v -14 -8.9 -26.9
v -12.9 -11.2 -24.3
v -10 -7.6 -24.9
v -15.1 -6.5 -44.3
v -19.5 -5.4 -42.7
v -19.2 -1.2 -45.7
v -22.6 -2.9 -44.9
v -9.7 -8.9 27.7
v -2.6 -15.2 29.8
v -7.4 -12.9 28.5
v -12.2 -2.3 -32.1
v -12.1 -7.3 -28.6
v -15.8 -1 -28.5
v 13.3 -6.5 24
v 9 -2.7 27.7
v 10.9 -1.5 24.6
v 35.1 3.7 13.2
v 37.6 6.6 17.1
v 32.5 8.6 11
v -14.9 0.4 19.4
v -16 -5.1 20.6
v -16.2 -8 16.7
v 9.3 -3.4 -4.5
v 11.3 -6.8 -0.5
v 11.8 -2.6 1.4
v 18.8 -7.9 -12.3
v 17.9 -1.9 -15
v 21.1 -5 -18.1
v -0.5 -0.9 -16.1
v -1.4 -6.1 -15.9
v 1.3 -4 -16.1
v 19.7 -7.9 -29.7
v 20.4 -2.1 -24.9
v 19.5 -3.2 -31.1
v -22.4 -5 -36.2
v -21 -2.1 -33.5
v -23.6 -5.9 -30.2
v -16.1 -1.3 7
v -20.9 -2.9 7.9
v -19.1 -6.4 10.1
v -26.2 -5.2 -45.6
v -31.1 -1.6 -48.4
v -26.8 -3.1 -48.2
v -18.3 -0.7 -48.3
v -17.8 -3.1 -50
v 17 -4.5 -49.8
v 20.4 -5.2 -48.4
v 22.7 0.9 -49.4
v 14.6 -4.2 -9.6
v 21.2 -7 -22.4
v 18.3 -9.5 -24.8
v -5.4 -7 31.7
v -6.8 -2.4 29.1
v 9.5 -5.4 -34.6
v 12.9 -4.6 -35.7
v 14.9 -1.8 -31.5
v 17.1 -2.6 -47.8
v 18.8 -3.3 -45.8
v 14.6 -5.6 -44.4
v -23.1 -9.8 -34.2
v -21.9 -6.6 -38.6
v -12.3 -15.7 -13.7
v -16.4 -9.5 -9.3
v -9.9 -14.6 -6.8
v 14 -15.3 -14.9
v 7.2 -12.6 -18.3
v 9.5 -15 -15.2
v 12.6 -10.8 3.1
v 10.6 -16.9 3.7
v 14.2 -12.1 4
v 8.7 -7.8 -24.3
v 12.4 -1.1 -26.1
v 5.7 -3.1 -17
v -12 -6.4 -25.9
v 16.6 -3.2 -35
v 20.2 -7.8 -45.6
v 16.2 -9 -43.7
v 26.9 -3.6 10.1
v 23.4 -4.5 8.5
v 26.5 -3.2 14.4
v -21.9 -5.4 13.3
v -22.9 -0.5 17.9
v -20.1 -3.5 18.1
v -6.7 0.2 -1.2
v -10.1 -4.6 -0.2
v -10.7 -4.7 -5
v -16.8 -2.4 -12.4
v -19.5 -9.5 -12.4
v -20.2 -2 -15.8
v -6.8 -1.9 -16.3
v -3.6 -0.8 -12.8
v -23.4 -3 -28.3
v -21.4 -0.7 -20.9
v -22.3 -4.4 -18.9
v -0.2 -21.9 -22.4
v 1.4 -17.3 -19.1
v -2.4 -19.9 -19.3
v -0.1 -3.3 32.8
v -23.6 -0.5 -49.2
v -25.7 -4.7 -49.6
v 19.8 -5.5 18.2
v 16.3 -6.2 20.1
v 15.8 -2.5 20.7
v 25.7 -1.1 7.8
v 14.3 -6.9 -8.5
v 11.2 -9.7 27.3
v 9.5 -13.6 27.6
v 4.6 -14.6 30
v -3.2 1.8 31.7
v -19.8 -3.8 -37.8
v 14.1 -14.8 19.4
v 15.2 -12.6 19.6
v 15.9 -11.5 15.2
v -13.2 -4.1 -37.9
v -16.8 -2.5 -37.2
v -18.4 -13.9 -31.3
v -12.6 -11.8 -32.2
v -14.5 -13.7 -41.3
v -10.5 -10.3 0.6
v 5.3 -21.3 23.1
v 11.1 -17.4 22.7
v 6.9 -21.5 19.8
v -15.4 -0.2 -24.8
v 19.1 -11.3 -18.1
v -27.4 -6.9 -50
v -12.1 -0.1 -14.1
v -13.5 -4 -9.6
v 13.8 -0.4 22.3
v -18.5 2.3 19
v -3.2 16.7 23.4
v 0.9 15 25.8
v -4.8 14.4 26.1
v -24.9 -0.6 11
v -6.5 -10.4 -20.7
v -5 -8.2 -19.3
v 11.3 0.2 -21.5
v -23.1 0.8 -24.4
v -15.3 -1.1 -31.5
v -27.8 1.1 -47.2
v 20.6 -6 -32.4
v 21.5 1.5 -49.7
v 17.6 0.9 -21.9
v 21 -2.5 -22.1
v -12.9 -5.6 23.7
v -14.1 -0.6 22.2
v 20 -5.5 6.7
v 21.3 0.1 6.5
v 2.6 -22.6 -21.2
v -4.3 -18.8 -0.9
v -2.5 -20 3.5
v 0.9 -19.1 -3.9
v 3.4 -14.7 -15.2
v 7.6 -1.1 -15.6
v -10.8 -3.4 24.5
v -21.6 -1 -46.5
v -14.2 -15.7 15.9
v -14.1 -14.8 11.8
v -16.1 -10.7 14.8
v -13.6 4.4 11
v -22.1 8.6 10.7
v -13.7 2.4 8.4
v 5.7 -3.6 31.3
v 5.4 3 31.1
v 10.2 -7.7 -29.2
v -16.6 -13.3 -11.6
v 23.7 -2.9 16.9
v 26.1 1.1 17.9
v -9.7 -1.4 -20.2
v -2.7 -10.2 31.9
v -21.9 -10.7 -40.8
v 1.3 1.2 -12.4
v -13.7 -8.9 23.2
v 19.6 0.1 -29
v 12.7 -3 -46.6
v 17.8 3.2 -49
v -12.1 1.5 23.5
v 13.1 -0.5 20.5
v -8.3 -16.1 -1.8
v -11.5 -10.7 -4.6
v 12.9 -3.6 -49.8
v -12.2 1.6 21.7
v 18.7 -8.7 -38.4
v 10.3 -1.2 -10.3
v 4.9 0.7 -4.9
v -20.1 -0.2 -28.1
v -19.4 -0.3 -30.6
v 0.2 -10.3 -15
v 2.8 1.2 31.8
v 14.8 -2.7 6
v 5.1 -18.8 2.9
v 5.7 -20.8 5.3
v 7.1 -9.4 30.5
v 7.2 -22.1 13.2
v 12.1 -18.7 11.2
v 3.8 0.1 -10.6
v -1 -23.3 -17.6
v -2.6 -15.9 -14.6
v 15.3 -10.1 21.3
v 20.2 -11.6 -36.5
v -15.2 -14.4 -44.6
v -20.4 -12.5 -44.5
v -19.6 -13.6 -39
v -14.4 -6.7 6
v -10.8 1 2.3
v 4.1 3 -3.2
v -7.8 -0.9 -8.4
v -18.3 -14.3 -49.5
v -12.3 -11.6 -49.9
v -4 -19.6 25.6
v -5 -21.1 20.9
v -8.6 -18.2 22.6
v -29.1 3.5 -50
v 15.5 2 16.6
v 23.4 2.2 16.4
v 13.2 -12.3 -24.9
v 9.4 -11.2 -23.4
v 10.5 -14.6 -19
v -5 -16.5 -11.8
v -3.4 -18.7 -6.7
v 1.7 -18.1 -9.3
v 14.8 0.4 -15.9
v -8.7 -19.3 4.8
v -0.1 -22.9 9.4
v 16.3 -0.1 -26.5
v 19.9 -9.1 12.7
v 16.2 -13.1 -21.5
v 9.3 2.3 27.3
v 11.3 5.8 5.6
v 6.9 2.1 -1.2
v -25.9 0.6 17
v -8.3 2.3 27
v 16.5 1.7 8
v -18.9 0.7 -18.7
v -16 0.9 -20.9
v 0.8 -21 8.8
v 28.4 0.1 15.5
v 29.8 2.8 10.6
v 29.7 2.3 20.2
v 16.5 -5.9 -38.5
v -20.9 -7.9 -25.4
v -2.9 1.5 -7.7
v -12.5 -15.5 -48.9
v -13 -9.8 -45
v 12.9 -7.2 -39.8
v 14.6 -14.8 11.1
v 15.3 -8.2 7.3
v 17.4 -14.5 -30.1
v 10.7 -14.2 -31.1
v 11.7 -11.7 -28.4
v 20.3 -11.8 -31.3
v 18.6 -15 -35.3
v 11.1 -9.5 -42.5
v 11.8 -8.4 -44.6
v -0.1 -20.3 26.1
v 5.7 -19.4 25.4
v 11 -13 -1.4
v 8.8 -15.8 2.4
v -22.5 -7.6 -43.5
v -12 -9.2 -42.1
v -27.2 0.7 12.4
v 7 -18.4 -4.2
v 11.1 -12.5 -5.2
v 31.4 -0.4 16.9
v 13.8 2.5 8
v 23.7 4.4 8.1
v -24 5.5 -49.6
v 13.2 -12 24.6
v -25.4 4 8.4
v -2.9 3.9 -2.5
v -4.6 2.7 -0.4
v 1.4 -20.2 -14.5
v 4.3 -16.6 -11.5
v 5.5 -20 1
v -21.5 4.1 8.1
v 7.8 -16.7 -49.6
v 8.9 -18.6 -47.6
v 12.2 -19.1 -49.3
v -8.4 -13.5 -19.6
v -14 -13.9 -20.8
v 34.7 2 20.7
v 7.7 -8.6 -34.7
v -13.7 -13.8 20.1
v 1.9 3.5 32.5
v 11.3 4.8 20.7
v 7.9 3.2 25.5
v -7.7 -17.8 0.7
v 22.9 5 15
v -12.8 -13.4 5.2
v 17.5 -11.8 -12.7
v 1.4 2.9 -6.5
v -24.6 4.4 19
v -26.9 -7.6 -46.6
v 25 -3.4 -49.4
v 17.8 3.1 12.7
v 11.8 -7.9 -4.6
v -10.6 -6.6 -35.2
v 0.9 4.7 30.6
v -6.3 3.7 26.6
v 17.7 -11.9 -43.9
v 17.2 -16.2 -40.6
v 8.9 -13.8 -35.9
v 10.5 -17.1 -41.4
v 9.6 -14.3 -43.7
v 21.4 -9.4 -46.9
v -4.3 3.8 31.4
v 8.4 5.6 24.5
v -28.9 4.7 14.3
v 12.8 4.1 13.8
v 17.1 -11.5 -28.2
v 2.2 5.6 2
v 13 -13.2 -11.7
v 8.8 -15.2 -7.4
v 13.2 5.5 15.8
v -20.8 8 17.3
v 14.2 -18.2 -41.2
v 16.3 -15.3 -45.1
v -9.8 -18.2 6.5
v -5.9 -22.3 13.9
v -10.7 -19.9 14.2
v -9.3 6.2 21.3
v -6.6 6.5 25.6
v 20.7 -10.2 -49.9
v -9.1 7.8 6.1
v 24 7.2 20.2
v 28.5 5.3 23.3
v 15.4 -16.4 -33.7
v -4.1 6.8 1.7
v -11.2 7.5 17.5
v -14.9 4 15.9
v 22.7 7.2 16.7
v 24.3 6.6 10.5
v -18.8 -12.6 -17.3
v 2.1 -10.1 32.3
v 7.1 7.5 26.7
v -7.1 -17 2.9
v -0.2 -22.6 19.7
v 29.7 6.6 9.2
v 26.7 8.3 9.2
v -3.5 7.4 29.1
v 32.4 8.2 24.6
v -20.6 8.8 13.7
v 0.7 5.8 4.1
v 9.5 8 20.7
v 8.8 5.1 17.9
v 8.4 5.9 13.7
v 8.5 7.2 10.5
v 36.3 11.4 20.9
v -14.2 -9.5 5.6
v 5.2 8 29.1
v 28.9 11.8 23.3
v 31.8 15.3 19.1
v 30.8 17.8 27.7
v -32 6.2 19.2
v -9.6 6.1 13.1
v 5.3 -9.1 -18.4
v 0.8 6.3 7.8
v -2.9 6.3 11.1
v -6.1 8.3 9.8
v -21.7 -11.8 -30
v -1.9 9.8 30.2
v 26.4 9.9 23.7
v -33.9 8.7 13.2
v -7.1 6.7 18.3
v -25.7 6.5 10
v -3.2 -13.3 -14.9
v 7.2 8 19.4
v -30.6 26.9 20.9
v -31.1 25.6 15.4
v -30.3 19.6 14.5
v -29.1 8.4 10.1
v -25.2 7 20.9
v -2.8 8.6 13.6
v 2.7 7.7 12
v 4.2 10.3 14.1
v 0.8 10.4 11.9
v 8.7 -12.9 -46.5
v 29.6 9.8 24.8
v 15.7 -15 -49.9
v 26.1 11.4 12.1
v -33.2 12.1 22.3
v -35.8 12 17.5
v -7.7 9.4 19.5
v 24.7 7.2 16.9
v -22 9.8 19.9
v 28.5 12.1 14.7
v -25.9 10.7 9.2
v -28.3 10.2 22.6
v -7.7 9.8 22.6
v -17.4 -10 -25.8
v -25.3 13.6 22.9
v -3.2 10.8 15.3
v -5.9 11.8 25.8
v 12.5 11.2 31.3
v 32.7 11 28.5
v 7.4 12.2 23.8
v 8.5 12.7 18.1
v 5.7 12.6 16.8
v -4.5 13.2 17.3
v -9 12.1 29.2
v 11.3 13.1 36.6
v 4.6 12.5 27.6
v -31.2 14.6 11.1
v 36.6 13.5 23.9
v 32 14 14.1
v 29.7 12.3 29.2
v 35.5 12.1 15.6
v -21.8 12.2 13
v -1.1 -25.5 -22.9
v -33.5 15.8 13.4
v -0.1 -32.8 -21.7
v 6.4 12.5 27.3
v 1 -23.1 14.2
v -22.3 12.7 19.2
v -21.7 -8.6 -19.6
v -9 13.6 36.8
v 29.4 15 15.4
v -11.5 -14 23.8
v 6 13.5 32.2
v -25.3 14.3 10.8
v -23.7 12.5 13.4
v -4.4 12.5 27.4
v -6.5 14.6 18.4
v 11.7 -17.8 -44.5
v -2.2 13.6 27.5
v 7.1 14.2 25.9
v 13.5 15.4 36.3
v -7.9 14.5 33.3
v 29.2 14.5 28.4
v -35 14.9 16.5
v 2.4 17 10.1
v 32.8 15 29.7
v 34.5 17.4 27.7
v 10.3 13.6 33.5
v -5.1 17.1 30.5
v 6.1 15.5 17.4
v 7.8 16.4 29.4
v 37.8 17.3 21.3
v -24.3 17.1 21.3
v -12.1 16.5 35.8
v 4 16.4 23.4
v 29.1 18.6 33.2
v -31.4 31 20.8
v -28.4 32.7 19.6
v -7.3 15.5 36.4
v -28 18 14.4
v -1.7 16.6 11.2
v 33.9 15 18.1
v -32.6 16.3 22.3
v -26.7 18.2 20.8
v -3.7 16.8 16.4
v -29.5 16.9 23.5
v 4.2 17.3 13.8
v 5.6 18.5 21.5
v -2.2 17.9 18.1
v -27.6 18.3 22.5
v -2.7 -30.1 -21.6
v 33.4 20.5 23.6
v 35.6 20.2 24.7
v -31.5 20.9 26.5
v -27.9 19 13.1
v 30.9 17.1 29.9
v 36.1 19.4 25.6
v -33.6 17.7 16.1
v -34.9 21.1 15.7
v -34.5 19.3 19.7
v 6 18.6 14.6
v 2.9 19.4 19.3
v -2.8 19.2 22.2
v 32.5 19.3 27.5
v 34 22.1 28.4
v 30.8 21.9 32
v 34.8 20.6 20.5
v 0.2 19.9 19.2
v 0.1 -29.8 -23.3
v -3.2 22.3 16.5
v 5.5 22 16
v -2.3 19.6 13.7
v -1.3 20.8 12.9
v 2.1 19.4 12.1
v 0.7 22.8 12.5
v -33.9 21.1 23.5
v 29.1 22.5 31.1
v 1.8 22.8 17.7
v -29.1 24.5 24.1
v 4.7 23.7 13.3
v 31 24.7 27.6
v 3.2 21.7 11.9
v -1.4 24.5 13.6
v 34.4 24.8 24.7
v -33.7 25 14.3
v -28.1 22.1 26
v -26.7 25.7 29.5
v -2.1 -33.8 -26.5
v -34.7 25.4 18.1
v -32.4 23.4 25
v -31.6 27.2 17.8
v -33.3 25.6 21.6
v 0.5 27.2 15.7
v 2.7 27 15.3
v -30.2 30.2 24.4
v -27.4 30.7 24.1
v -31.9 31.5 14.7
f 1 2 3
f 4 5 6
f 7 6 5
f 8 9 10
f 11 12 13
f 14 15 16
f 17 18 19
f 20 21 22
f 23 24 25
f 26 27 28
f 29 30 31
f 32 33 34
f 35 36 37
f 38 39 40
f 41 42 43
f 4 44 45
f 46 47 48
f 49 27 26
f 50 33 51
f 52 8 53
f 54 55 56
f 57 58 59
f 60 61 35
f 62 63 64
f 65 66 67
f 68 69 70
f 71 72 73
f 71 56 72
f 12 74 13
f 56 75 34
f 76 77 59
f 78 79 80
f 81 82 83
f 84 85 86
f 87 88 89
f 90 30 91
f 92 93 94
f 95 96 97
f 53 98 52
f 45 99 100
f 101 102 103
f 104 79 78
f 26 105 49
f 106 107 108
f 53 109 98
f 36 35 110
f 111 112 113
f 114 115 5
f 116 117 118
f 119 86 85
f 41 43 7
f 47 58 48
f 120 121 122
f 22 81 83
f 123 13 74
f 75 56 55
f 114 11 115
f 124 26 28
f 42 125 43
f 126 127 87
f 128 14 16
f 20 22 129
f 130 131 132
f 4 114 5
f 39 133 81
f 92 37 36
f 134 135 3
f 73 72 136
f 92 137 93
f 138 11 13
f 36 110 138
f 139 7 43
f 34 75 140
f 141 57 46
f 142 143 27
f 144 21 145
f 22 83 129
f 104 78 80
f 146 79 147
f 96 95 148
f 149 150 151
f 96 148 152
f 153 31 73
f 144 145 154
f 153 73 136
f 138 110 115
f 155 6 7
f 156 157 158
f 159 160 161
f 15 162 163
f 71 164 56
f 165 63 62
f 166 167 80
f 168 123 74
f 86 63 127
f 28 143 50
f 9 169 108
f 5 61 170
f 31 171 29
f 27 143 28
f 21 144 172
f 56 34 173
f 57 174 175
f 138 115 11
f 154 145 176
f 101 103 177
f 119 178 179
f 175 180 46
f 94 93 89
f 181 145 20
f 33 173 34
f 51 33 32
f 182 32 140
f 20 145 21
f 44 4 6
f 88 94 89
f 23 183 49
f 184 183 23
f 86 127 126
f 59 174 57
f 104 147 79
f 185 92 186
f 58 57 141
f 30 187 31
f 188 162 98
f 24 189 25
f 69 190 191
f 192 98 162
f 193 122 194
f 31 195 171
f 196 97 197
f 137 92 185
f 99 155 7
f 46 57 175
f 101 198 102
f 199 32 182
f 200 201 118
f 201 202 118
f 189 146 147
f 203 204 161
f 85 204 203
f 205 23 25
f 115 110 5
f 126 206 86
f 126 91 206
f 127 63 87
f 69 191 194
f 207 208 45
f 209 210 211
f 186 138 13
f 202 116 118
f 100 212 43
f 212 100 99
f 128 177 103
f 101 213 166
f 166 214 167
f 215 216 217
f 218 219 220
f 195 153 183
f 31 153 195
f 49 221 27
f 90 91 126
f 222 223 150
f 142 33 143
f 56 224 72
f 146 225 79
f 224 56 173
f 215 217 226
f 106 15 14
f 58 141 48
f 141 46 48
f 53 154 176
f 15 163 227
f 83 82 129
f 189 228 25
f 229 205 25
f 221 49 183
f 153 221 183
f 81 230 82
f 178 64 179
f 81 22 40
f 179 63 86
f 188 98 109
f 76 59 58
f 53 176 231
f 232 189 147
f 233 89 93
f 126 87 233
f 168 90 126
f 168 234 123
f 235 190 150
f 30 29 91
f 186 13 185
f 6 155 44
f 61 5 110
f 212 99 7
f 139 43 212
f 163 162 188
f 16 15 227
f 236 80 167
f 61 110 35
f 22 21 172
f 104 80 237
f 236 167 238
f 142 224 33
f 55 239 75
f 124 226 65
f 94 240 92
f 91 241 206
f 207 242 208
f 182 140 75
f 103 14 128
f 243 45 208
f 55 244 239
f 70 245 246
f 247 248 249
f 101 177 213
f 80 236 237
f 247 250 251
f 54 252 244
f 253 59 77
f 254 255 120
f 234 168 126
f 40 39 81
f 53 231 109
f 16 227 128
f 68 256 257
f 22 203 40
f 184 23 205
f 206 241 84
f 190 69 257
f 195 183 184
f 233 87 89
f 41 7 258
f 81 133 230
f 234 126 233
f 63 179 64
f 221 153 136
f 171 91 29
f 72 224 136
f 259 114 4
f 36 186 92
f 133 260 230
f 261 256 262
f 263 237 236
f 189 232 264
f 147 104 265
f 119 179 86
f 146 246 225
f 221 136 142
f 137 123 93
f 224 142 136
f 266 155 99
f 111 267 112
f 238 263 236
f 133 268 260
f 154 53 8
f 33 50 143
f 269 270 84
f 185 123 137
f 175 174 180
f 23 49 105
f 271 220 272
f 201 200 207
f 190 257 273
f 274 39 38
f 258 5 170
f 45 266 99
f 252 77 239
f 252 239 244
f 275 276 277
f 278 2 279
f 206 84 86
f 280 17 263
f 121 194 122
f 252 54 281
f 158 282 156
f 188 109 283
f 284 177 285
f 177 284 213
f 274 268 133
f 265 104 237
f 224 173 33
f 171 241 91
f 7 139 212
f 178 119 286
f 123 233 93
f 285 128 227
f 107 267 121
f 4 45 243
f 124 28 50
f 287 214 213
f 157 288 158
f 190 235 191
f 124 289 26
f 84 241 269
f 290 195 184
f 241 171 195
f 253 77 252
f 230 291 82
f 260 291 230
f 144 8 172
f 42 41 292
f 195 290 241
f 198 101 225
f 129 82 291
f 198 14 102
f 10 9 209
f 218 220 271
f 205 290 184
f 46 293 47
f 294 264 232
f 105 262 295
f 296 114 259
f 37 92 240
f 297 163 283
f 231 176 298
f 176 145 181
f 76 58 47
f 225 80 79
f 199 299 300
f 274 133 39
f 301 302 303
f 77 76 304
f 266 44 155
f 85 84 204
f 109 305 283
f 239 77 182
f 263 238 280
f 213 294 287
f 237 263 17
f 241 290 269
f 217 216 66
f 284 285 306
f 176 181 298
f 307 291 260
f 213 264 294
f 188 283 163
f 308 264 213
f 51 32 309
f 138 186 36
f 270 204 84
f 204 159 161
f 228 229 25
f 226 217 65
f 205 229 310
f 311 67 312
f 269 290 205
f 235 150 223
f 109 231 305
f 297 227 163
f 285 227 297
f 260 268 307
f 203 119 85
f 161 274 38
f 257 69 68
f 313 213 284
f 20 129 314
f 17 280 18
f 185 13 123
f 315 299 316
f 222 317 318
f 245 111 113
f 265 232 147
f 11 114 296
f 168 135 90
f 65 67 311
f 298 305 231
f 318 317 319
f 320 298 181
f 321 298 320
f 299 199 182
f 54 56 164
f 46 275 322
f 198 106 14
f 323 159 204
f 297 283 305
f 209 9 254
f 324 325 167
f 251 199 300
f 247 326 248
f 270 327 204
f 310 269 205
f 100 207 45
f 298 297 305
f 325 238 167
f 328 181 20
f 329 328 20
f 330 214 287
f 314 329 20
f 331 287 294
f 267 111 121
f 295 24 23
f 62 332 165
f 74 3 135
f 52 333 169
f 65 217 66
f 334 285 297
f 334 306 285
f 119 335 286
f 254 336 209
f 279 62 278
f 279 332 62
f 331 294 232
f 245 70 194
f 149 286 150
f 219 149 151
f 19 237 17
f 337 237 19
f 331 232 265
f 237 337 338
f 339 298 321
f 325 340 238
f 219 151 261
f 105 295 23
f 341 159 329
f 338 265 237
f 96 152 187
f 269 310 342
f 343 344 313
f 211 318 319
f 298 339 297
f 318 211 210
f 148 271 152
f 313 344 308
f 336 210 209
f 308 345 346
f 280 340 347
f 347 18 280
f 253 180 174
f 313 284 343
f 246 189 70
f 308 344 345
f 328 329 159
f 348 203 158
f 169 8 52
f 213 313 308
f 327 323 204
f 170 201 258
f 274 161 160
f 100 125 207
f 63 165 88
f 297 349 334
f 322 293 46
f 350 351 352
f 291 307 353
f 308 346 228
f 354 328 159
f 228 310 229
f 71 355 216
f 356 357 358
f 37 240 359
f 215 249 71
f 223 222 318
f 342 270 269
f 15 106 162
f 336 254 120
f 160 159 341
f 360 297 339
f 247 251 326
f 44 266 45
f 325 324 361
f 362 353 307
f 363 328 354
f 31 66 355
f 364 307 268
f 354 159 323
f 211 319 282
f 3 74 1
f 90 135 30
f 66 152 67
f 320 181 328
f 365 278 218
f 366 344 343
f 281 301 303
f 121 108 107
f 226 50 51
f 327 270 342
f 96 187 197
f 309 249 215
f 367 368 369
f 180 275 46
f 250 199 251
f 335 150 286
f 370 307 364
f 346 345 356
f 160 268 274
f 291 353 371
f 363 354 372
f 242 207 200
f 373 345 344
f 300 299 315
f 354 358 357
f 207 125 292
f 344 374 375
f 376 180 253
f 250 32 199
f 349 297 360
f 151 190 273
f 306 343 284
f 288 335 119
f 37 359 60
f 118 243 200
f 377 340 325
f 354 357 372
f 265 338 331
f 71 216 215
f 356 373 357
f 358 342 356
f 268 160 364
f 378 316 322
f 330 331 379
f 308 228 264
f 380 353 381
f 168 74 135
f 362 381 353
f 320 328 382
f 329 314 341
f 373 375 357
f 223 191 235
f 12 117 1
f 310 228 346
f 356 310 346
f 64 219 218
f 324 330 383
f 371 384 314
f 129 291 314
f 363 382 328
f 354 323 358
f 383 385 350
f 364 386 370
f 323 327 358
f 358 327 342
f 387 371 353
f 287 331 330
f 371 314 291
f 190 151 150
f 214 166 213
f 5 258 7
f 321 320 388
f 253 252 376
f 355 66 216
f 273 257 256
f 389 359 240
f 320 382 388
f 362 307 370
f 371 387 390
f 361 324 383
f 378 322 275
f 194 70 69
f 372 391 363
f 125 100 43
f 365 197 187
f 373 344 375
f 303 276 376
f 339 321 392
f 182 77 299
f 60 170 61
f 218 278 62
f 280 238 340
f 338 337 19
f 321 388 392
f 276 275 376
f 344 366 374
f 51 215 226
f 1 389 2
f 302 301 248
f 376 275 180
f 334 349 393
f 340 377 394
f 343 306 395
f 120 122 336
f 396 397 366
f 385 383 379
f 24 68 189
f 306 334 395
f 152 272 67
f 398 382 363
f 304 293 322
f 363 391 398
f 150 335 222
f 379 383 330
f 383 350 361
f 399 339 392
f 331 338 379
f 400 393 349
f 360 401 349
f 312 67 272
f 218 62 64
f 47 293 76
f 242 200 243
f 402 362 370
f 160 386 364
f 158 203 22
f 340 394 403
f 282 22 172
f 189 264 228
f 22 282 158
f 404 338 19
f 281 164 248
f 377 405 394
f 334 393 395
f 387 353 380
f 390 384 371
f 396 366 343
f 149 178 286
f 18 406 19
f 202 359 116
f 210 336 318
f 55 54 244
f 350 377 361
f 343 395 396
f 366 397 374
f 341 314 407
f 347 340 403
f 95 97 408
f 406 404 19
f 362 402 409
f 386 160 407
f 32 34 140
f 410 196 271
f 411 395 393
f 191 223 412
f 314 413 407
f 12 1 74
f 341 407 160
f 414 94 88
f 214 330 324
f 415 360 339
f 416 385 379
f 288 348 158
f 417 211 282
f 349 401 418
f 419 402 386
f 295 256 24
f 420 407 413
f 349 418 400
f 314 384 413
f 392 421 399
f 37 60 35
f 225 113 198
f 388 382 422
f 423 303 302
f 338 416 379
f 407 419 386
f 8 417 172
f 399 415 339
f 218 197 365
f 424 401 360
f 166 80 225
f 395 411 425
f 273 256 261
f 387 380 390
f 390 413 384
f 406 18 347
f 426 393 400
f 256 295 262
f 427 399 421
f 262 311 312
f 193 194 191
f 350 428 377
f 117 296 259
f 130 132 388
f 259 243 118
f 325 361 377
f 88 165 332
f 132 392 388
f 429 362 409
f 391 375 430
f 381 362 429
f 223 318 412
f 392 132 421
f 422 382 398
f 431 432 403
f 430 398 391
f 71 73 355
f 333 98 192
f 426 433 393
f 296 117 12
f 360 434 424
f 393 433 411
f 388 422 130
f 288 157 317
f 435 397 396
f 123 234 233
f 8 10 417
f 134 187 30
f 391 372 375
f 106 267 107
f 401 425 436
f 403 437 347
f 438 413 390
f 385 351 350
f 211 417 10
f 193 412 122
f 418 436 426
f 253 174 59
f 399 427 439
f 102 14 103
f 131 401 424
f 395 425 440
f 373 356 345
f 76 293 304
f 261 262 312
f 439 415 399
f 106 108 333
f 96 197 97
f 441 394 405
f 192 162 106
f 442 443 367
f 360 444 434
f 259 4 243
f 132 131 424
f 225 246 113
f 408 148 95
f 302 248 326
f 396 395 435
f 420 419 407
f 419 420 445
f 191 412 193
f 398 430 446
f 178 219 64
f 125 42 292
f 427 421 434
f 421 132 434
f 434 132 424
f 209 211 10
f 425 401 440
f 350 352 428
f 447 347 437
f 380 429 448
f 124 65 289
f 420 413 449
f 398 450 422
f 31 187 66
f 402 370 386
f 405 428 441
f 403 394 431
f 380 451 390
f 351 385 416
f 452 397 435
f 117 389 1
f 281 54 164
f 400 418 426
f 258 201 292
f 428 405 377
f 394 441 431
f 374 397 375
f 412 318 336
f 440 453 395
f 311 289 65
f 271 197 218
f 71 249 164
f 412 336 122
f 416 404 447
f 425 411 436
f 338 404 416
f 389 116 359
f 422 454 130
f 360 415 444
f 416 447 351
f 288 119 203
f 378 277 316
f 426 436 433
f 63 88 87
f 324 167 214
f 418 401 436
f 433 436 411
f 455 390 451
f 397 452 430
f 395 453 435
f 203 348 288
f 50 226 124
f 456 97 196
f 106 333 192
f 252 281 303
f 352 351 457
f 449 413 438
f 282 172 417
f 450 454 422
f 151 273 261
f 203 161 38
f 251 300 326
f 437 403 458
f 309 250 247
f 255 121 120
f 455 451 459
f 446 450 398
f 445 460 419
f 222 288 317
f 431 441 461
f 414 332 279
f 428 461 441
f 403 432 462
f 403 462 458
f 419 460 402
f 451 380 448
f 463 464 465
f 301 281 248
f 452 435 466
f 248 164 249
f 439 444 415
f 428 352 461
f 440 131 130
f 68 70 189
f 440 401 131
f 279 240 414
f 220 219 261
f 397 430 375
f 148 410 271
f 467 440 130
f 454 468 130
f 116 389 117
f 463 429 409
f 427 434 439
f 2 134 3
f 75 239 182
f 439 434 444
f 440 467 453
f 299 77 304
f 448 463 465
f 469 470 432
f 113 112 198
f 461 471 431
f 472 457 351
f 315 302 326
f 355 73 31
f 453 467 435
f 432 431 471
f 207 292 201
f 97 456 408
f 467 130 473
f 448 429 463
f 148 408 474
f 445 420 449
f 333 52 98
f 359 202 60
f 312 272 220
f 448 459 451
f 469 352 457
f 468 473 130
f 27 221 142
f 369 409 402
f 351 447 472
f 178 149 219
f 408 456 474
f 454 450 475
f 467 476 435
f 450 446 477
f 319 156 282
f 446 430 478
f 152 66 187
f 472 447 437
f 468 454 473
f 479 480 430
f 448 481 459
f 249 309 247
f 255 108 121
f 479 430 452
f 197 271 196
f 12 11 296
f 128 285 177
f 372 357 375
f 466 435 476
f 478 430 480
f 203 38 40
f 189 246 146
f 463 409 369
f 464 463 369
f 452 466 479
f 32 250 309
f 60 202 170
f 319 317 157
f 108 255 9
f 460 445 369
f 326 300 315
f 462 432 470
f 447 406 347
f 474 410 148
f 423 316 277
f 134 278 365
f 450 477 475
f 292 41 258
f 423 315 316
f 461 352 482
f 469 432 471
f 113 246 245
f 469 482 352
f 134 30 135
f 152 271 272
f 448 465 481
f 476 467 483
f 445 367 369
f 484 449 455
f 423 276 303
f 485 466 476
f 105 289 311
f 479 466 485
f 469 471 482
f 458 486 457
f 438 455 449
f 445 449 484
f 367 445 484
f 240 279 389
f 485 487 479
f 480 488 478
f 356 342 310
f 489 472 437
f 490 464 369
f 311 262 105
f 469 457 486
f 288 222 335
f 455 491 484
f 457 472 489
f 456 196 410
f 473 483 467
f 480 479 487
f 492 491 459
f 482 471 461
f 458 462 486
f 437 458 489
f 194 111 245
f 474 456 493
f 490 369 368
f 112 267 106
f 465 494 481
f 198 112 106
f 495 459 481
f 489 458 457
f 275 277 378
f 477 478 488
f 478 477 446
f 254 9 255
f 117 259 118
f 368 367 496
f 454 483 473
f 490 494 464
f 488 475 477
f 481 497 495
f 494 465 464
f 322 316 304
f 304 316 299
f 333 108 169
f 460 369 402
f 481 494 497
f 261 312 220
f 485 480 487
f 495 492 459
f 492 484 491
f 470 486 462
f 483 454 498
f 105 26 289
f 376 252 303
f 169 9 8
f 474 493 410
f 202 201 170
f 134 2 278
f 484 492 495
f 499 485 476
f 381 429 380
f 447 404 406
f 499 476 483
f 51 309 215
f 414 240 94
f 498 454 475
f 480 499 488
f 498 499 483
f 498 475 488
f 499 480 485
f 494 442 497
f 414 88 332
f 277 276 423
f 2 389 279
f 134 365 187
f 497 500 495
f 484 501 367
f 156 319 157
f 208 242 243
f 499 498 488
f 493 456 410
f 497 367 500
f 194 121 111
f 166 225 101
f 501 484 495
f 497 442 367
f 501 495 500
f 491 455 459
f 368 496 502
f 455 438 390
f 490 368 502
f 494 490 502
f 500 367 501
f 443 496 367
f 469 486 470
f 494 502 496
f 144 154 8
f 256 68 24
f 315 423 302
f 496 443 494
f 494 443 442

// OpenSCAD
polyhedron(
  points = [
    [-2.7,-30.1,-21.6],
    [-28.4,32.7,19.6],
    [-31.9,31.5,14.7],
    [-12.9,-11.2,-24.3],
    [-30.2,30.2,24.4],
    [-27.4,30.7,24.1],
    [-15.1,-6.5,-44.3],
    [-31.4,31.0,20.8],
    [-19.5,-9.5,-12.4],
    [5.5,-20.0,1.0],
    [-33.3,25.6,21.6],
    [2.7,27.0,15.3],
    [11.1,-12.5,-5.2],
    [0.5,27.2,15.7],
    [-30.6,26.9,20.9],
    [-34.7,25.4,18.1],
    [-13.0,-9.8,-45.0],
    [-16.4,-9.5,-9.3],
    [-31.6,27.2,17.8],
    [7.0,-18.4,-4.2],
    [-33.7,25.0,14.3],
    [-29.1,24.5,24.1],
    [12.6,-10.8,3.1],
    [-1.4,24.5,13.6],
    [-31.1,25.6,15.4],
    [-9.9,-14.6,-6.8],
    [-26.7,25.7,29.5],
    [-8.3,-16.1,-1.8],
    [14.9,-1.8,-31.5],
    [4.7,23.7,13.3],
    [-10.7,-19.9,14.2],
    [31.0,24.7,27.6],
    [-12.0,-6.4,-25.9],
    [-32.4,23.4,25.0],
    [8.7,-7.8,-24.3],
    [3.2,21.7,11.9],
    [34.4,24.8,24.7],
    [5.5,22.0,16.0],
    [0.2,19.9,19.2],
    [17.7,-11.9,-43.9],
    [-33.9,21.1,23.5],
    [-21.9,-10.7,-40.8],
    [-31.5,20.9,26.5],
    [11.7,-17.8,-44.5],
    [1.8,22.8,17.7],
    [-34.5,19.3,19.7],
    [20.2,-7.8,-45.6],
    [-1.3,20.8,12.9],
    [10.5,-17.1,-41.4],
    [33.4,20.5,23.6],
    [12.9,-7.2,-39.8],
    [-5.0,-16.5,-11.8],
    [29.1,22.5,31.1],
    [-17.8,-3.1,-50.0],
    [11.7,-11.7,-28.4],
    [-2.3,19.6,13.7],
    [34.8,20.6,20.5],
    [-28.1,22.1,26.0],
    [2.1,19.4,12.1],
    [-23.6,-5.9,-30.2],
    [19.7,-7.9,-29.7],
    [-30.3,19.6,14.5],
    [34.0,22.1,28.4],
    [14.3,-6.9,-8.5],
    [-34.9,21.1,15.7],
    [-5.0,-8.2,-19.3],
    [7.7,-8.6,-34.7],
    [-0.1,-20.3,26.1],
    [30.8,21.9,32.0],
    [0.7,22.8,12.5],
    [35.6,20.2,24.7],
    [11.3,-6.8,-0.5],
    [2.9,19.4,19.3],
    [30.8,17.8,27.7],
    [6.0,18.6,14.6],
    [-4.3,-18.8,-0.9],
    [-27.6,18.3,22.5],
    [32.5,19.3,27.5],
    [-21.9,-5.4,13.3],
    [23.4,-4.5,8.5],
    [-7.1,-17.0,2.9],
    [-12.8,-13.4,5.2],
    [-2.8,19.2,22.2],
    [-32.6,16.3,22.3],
    [-27.9,19.0,13.1],
    [13.3,-6.5,24.0],
    [4.2,17.3,13.8],
    [-1.7,16.6,11.2],
    [-3.2,22.3,16.5],
    [-26.7,18.2,20.8],
    [7.2,-22.1,13.2],
    [29.1,18.6,33.2],
    [2.4,17.0,10.1],
    [15.7,-15.0,-49.9],
    [-33.5,15.8,13.4],
    [5.6,18.5,21.5],
    [5.7,-3.6,31.3],
    [34.5,17.4,27.7],
    [4.3,-16.6,-11.5],
    [4.0,16.4,23.4],
    [-5.1,17.1,30.5],
    [-9.7,-8.9,27.7],
    [-0.1,-32.8,-21.7],
    [20.6,-6.0,-32.4],
    [-24.3,17.1,21.3],
    [-3.2,16.7,23.4],
    [36.1,19.4,25.6],
    [30.9,17.1,29.9],
    [-18.4,-13.9,-31.3],
    [20.0,-5.5,6.7],
    [-33.6,17.7,16.1],
    [-5.0,-21.1,20.9],
    [-3.7,16.8,16.4],
    [-35.0,14.9,16.5],
    [-2.2,17.9,18.1],
    [-12.1,16.5,35.8],
    [-22.5,-7.6,-43.5],
    [32.8,15.0,29.7],
    [7.8,16.4,29.4],
    [-2.1,-33.8,-26.5],
    [29.2,14.5,28.4],
    [19.1,-11.3,-18.1],
    [-18.3,-14.3,-49.5],
    [31.8,15.3,19.1],
    [1.7,-18.1,-9.3],
    [-12.6,-11.8,-32.2],
    [29.4,15.0,15.4],
    [-16.2,-8.0,16.7],
    [-16.0,-5.1,20.6],
    [-6.5,-10.4,-20.7],
    [-9.0,13.6,36.8],
    [-10.5,-10.3,0.6],
    [-29.5,16.9,23.5],
    [-0.2,-22.6,19.7],
    [-25.3,14.3,10.8],
    [5.7,12.6,16.8],
    [33.9,15.0,18.1],
    [7.4,12.2,23.8],
    [37.8,17.3,21.3],
    [0.9,15.0,25.8],
    [-14.1,-14.8,11.8],
    [6.0,13.5,32.2],
    [32.0,14.0,14.1],
    [-19.5,-5.4,-42.7],
    [-4.8,14.4,26.1],
    [12.1,-18.7,11.2],
    [1.0,-23.1,14.2],
    [6.1,15.5,17.4],
    [14.6,-14.8,11.1],
    [4.6,12.5,27.6],
    [8.7,-12.9,-46.5],
    [-7.3,15.5,36.4],
    [-14.5,-13.7,-41.3],
    [-28.0,18.0,14.4],
    [28.5,12.1,14.7],
    [36.6,13.5,23.9],
    [-10.0,-7.6,-24.9],
    [8.5,12.7,18.1],
    [11.1,-17.4,22.7],
    [7.1,14.2,25.9],
    [13.5,15.4,36.3],
    [-23.7,12.5,13.4],
    [11.8,-7.9,-4.6],
    [-2.2,13.6,27.5],
    [-7.9,14.5,33.3],
    [-7.7,-17.8,0.7],
    [-3.2,-13.3,-14.9],
    [-5.9,-22.3,13.9],
    [7.2,-12.6,-18.3],
    [-6.5,14.6,18.4],
    [-31.2,14.6,11.1],
    [35.5,12.1,15.6],
    [32.7,11.0,28.5],
    [-33.2,12.1,22.3],
    [-12.9,-5.6,23.7],
    [-4.4,12.5,27.4],
    [11.3,13.1,36.6],
    [-21.8,12.2,13.0],
    [-25.3,13.6,22.9],
    [13.2,-12.0,24.6],
    [10.3,13.6,33.5],
    [-9.0,12.1,29.2],
    [-22.3,12.7,19.2],
    [15.2,-12.6,19.6],
    [28.9,11.8,23.3],
    [6.4,12.5,27.3],
    [-25.9,10.7,9.2],
    [6.9,-21.5,19.8],
    [-28.3,10.2,22.6],
    [29.7,12.3,29.2],
    [15.4,-16.4,-33.7],
    [26.1,11.4,12.1],
    [-3.2,10.8,15.3],
    [-5.9,11.8,25.8],
    [-21.7,-11.8,-30.0],
    [14.2,-18.2,-41.2],
    [0.8,-21.0,8.8],
    [16.5,-5.9,-38.5],
    [12.5,11.2,31.3],
    [-12.5,-15.5,-48.9],
    [32.5,8.6,11.0],
    [-21.9,-6.6,-38.6],
    [-20.6,8.8,13.7],
    [12.9,-4.6,-35.7],
    [-13.7,-13.8,20.1],
    [-13.2,-4.1,-37.9],
    [-4.5,13.2,17.3],
    [-22.1,8.6,10.7],
    [0.8,10.4,11.9],
    [10.7,-14.2,-31.1],
    [-22.0,9.8,19.9],
    [11.8,-8.4,-44.6],
    [-1.9,9.8,30.2],
    [18.6,-15.0,-35.3],
    [17.1,-11.5,-28.2],
    [36.3,11.4,20.9],
    [7.1,7.5,26.7],
    [14.2,-12.1,4.0],
    [13.2,-12.3,-24.9],
    [5.2,8.0,29.1],
    [4.2,10.3,14.1],
    [-17.4,-10.0,-25.8],
    [24.7,7.2,16.9],
    [-14.0,-8.9,-26.9],
    [26.4,9.9,23.7],
    [29.6,9.8,24.8],
    [9.5,-5.4,-34.6],
    [-7.7,9.8,22.6],
    [0.1,-29.8,-23.3],
    [21.1,-5.0,-18.1],
    [7.2,8.0,19.4],
    [-7.7,9.4,19.5],
    [20.2,-11.6,-36.5],
    [-32.0,6.2,19.2],
    [-35.8,12.0,17.5],
    [19.9,-9.1,12.7],
    [-19.6,-13.6,-39.0],
    [-3.5,7.4,29.1],
    [0.2,-10.3,-15.0],
    [-20.8,8.0,17.3],
    [-25.2,7.0,20.9],
    [8.4,5.6,24.5],
    [29.7,6.6,9.2],
    [-29.1,8.4,10.1],
    [8.8,5.1,17.9],
    [-1.0,-23.3,-17.6],
    [-2.8,8.6,13.6],
    [11.3,5.8,5.6],
    [8.5,7.2,10.5],
    [-33.9,8.7,13.2],
    [-4.1,6.8,1.7],
    [10.6,-16.9,3.7],
    [-6.1,8.3,9.8],
    [0.9,-19.1,-3.9],
    [-3.4,-18.7,-6.7],
    [-11.2,7.5,17.5],
    [-9.3,6.2,21.3],
    [13.0,-13.2,-11.7],
    [2.2,5.6,2.0],
    [25.0,-3.4,-49.4],
    [5.3,-21.3,23.1],
    [2.7,7.7,12.0],
    [-9.1,7.8,6.1],
    [-2.9,6.3,11.1],
    [37.6,6.6,17.1],
    [9.6,-14.3,-43.7],
    [-8.4,-13.5,-19.6],
    [-25.4,4.0,8.4],
    [0.8,6.3,7.8],
    [-16.6,-13.3,-11.6],
    [-7.1,6.7,18.3],
    [-6.6,6.5,25.6],
    [-26.9,-7.6,-46.6],
    [-9.6,6.1,13.1],
    [8.4,5.9,13.7],
    [9.5,8.0,20.7],
    [-8.7,-19.3,4.8],
    [-25.7,6.5,10.0],
    [-13.6,4.4,11.0],
    [24.0,7.2,20.2],
    [18.3,-9.5,-24.8],
    [28.5,5.3,23.3],
    [0.9,4.7,30.6],
    [1.4,-17.3,-19.1],
    [0.7,5.8,4.1],
    [1.3,-4.0,-16.1],
    [-1.4,-6.1,-15.9],
    [-21.5,4.1,8.1],
    [13.2,5.5,15.8],
    [-24.6,4.4,19.0],
    [12.2,-19.1,-49.3],
    [-8.6,-18.2,22.6],
    [8.9,-18.6,-47.6],
    [-2.4,-19.9,-19.3],
    [9.5,-13.6,27.6],
    [-14.4,-6.7,6.0],
    [12.8,4.1,13.8],
    [26.7,8.3,9.2],
    [22.9,5.0,15.0],
    [22.7,7.2,16.7],
    [-14.2,-9.5,5.6],
    [-0.1,-22.9,9.4],
    [5.1,-18.8,2.9],
    [15.3,-8.2,7.3],
    [-2.9,3.9,-2.5],
    [24.3,6.6,10.5],
    [17.4,-14.5,-30.1],
    [-19.1,-6.4,10.1],
    [-14.9,4.0,15.9],
    [-2.7,-10.2,31.9],
    [-4.6,2.7,-0.4],
    [16.2,-13.1,-21.5],
    [18.7,-8.7,-38.4],
    [-13.7,2.4,8.4],
    [-28.9,4.7,14.3],
    [32.4,8.2,24.6],
    [1.9,3.5,32.5],
    [-27.4,-6.9,-50.0],
    [-4.3,3.8,31.4],
    [18.8,-7.9,-12.3],
    [-11.5,-10.7,-4.6],
    [23.7,4.4,8.1],
    [-4.0,-19.6,25.6],
    [29.8,2.8,10.6],
    [17.8,3.1,12.7],
    [29.7,2.3,20.2],
    [-6.3,3.7,26.6],
    [-23.6,-0.5,-49.2],
    [15.5,2.0,16.6],
    [4.6,-14.6,30.0],
    [-18.5,2.3,19.0],
    [23.4,2.2,16.4],
    [-14.2,-15.7,15.9],
    [-24.0,5.5,-49.6],
    [-15.2,-14.4,-44.6],
    [6.9,2.1,-1.2],
    [35.1,3.7,13.2],
    [34.7,2.0,20.7],
    [-3.2,1.8,31.7],
    [-2.6,-15.9,-14.6],
    [1.4,2.9,-6.5],
    [-12.0,-9.2,-42.1],
    [-23.1,-9.8,-34.2],
    [7.9,3.2,25.5],
    [-8.3,2.3,27.0],
    [7.8,-16.7,-49.6],
    [-2.9,1.5,-7.7],
    [-9.8,-18.2,6.5],
    [13.8,2.5,8.0],
    [-12.2,1.6,21.7],
    [9.3,2.3,27.3],
    [-21.7,-8.6,-19.6],
    [-18.8,-12.6,-17.3],
    [-29.1,3.5,-50.0],
    [4.1,3.0,-3.2],
    [16.5,1.7,8.0],
    [11.3,4.8,20.7],
    [16.3,-15.3,-45.1],
    [17.8,3.2,-49.0],
    [-27.8,1.1,-47.2],
    [-22.9,-0.5,17.9],
    [15.3,-10.1,21.3],
    [1.3,1.2,-12.4],
    [-1.1,-25.5,-22.9],
    [2.1,-10.1,32.3],
    [-27.2,0.7,12.4],
    [-11.5,-14.0,23.8],
    [-2.5,-20.0,3.5],
    [-7.4,-12.9,28.5],
    [-23.1,0.8,-24.4],
    [-12.3,-11.6,-49.9],
    [-12.1,1.5,23.5],
    [16.2,-9.0,-43.7],
    [-20.4,-12.5,-44.5],
    [-6.7,0.2,-1.2],
    [-10.8,1.0,2.3],
    [31.4,-0.4,16.9],
    [-15.4,-0.2,-24.8],
    [17.6,0.9,-21.9],
    [-16.0,0.9,-20.9],
    [28.4,0.1,15.5],
    [2.8,1.2,31.8],
    [12.9,-3.6,-49.8],
    [5.3,-9.1,-18.4],
    [-18.9,0.7,-18.7],
    [11.8,-2.6,1.4],
    [13.1,-0.5,20.5],
    [5.7,-20.8,5.3],
    [5.4,3.0,31.1],
    [20.7,-10.2,-49.9],
    [-20.1,-0.2,-28.1],
    [10.3,-1.2,-10.3],
    [4.9,0.7,-4.9],
    [-13.7,-8.9,23.2],
    [26.1,1.1,17.9],
    [-19.4,-0.3,-30.6],
    [19.6,0.1,-29.0],
    [16.3,-0.1,-26.5],
    [3.8,0.1,-10.6],
    [19.8,-5.5,18.2],
    [-3.6,-0.8,-12.8],
    [25.7,-1.1,7.8],
    [-25.9,0.6,17.0],
    [-12.1,-7.3,-28.6],
    [-26.8,-3.1,-48.2],
    [-15.8,-1.0,-28.5],
    [-21.4,-0.7,-20.9],
    [21.2,-7.0,-22.4],
    [9.4,-11.2,-23.4],
    [-10.6,-6.6,-35.2],
    [26.5,-3.2,14.4],
    [-24.9,-0.6,11.0],
    [-14.0,-13.9,-20.8],
    [10.5,-14.6,-19.0],
    [10.2,-7.7,-29.2],
    [-12.1,-0.1,-14.1],
    [14.8,0.4,-15.9],
    [-16.1,-10.7,14.8],
    [5.7,-19.4,25.4],
    [14.0,-15.3,-14.9],
    [-25.7,-4.7,-49.6],
    [-18.3,-0.7,-48.3],
    [-21.6,-1.0,-46.5],
    [-0.5,-0.9,-16.1],
    [11.2,-9.7,27.3],
    [7.1,-9.4,30.5],
    [21.3,0.1,6.5],
    [13.8,-0.4,22.3],
    [-14.1,-0.6,22.2],
    [21.5,1.5,-49.7],
    [-13.5,-4.0,-9.6],
    [21.4,-9.4,-46.9],
    [7.6,-1.1,-15.6],
    [-2.6,-15.2,29.8],
    [-14.9,0.4,19.4],
    [20.3,-11.8,-31.3],
    [12.4,-1.1,-26.1],
    [-9.7,-1.4,-20.2],
    [-6.8,-1.9,-16.3],
    [-7.8,-0.9,-8.4],
    [-16.1,-1.3,7.0],
    [10.9,-1.5,24.6],
    [22.7,0.9,-49.4],
    [-19.2,-1.2,-45.7],
    [-21.0,-2.1,-33.5],
    [17.9,-1.9,-15.0],
    [-20.9,-2.9,7.9],
    [15.8,-2.5,20.7],
    [-15.3,-1.1,-31.5],
    [11.3,0.2,-21.5],
    [15.9,-11.5,15.2],
    [26.9,-3.6,10.1],
    [20.4,-5.2,-48.4],
    [8.8,-15.8,2.4],
    [1.4,-20.2,-14.5],
    [21.0,-2.5,-22.1],
    [5.7,-3.1,-17.0],
    [-20.2,-2.0,-15.8],
    [14.6,-4.2,-9.6],
    [-10.7,-4.7,-5.0],
    [23.7,-2.9,16.9],
    [-6.8,-2.4,29.1],
    [-0.1,-3.3,32.8],
    [11.1,-9.5,-42.5],
    [-16.8,-2.4,-12.4],
    [-22.4,-5.0,-36.2],
    [17.5,-11.8,-12.7],
    [-31.1,-1.6,-48.4],
    [-16.8,-2.5,-37.2],
    [8.9,-13.8,-35.9],
    [17.2,-16.2,-40.6],
    [-20.1,-3.5,18.1],
    [9.0,-2.7,27.7],
    [-22.3,-4.4,-18.9],
    [3.4,-14.7,-15.2],
    [16.3,-6.2,20.1],
    [-10.8,-3.4,24.5],
    [9.5,-15.0,-15.2],
    [17.0,-4.5,-49.8],
    [-12.3,-15.7,-13.7],
    [-0.2,-21.9,-22.4],
    [20.4,-2.1,-24.9],
    [8.8,-15.2,-7.4],
    [2.6,-22.6,-21.2],
    [11.0,-13.0,-1.4],
    [-22.6,-2.9,-44.9],
    [-19.8,-3.8,-37.8],
    [19.5,-3.2,-31.1],
    [-12.2,-2.3,-32.1],
    [-23.4,-3.0,-28.3],
    [14.1,-14.8,19.4],
    [-10.1,-4.6,-0.2],
    [-5.4,-7.0,31.7],
    [17.1,-2.6,-47.8],
    [12.7,-3.0,-46.6],
    [14.8,-2.7,6.0],
    [14.6,-5.6,-44.4],
    [-20.9,-7.9,-25.4],
    [16.6,-3.2,-35.0],
    [9.3,-3.4,-4.5],
    [18.8,-3.3,-45.8],
    [-26.2,-5.2,-45.6]
  ],
  faces = [[156,3,223], [443,143,6], [143,443,485], [368,433,101], [405,403,488], [441,472,85], [200,264,336], [127,128,434], [385,71,499], [229,445,319], [285,286,423], [487,481,60], [59,444,465], [307,446,440], [404,467,501], [53,421,6], [442,452,478], [319,445,458], [280,481,407], [461,101,492], [28,203,226], [496,500,493], [465,201,342], [25,17,479], [477,168,419], [217,251,22], [456,436,34], [436,28,34], [405,32,403], [487,498,28], [496,372,46], [410,79,451], [471,360,78], [459,491,374], [457,8,464], [400,286,438], [473,406,489], [293,283,480], [492,462,461], [420,327,53], [447,475,399], [451,79,401], [458,63,319], [329,294,424], [462,338,461], [486,465,444], [450,183,490], [143,468,205], [152,125,108], [491,459,131], [485,404,501], [442,500,452], [187,158,260], [471,78,127], [32,405,377], [203,28,498], [468,488,205], [229,319,121], [404,317,467], [464,430,415], [441,85,427], [330,127,434], [144,139,105], [143,205,6], [78,411,446], [444,59,489], [156,65,129], [449,436,456], [406,369,489], [405,488,448], [448,486,444], [404,485,359], [103,498,487], [478,493,429], [445,455,378], [428,128,174], [330,471,127], [410,451,401], [426,79,109], [483,480,283], [253,367,75], [474,483,283], [456,285,432], [476,428,174], [449,456,432], [468,486,448], [485,443,422], [417,140,332], [313,207,278], [388,96,472], [28,414,34], [479,17,269], [410,394,460], [32,377,437], [430,17,459], [407,455,229], [329,309,433], [41,201,143], [423,362,285], [229,455,445], [393,174,128], [396,487,28], [358,494,493], [488,468,448], [371,428,476], [386,447,399], [320,27,131], [478,382,358], [457,406,473], [434,428,349], [487,396,481], [60,481,280], [103,60,312], [128,428,434], [443,6,421], [457,473,8], [458,391,499], [499,391,392], [415,430,459], [493,494,496], [79,426,401], [395,489,390], [429,493,500], [285,238,286], [462,96,381], [385,495,71], [387,302,251], [96,462,425], [145,187,90], [362,398,285], [339,293,245], [390,489,369], [485,422,327], [358,493,478], [475,361,399], [312,60,232], [152,373,334], [152,236,373], [426,109,495], [313,375,295], [295,375,491], [385,499,354], [143,486,468], [459,439,415], [439,400,415], [464,17,430], [145,387,251], [53,370,122], [291,111,322], [405,448,395], [152,108,236], [404,353,420], [327,420,353], [447,386,427], [460,328,399], [394,331,460], [413,408,218], [124,254,51], [391,432,398], [398,432,285], [445,416,458], [415,400,438], [367,301,276], [455,481,378], [436,397,28], [79,235,109], [396,28,397], [311,413,218], [85,472,424], [442,429,500], [442,478,429], [371,476,461], [350,388,472], [330,360,471], [385,247,495], [385,354,335], [391,458,416], [391,416,432], [360,402,78], [320,25,27], [307,127,78], [459,17,320], [338,462,381], [500,496,46], [344,371,461], [426,495,355], [406,457,384], [384,464,415], [415,438,437], [377,379,437], [367,302,196], [400,423,286], [390,405,395], [421,422,443], [486,143,201], [485,327,353], [353,404,359], [381,96,388], [350,472,441], [394,410,380], [465,486,201], [393,128,127], [323,410,401], [325,394,380], [481,397,378], [498,197,203], [419,311,121], [489,497,473], [439,346,400], [370,199,122], [498,103,312], [427,85,447], [370,53,16], [197,50,203], [303,148,217], [54,209,306], [328,386,399], [323,380,410], [213,435,306], [50,463,226], [372,496,211], [260,418,67], [415,437,379], [78,446,307], [338,344,461], [427,350,441], [453,484,22], [307,295,127], [354,499,392], [374,346,439], [453,251,302], [392,391,398], [457,464,384], [116,485,501], [402,411,78], [384,415,379], [25,320,17], [449,432,416], [423,400,362], [449,397,436], [6,205,341], [489,395,444], [402,365,411], [12,484,19], [380,323,376], [348,355,495], [321,401,426], [459,320,131], [235,303,109], [378,449,416], [406,377,369], [449,378,397], [327,422,333], [183,179,490], [380,376,325], [365,267,411], [101,461,476], [455,407,481], [374,310,304], [369,377,390], [382,494,358], [63,458,499], [98,124,454], [122,334,373], [9,453,302], [440,446,287], [41,143,116], [327,333,53], [197,372,463], [50,197,463], [290,292,345], [412,3,266], [459,374,439], [376,336,337], [187,145,158], [66,226,463], [332,204,417], [316,338,381], [343,386,356], [328,356,386], [411,267,287], [323,401,321], [481,396,397], [400,346,362], [353,359,485], [165,131,27], [406,384,377], [350,427,343], [158,179,294], [16,53,6], [407,229,121], [328,331,298], [417,81,140], [387,196,302], [319,466,121], [304,346,374], [392,398,340], [398,362,346], [463,372,211], [360,289,402], [402,289,365], [393,101,174], [272,501,467], [346,340,398], [235,399,361], [289,360,330], [475,85,361], [322,433,368], [454,124,51], [392,340,354], [452,259,478], [355,348,324], [162,12,63], [341,205,409], [497,489,59], [316,388,282], [326,371,344], [349,428,371], [452,500,46], [79,410,235], [470,39,232], [446,411,287], [265,48,469], [431,46,372], [422,421,333], [375,374,491], [316,318,338], [312,372,197], [337,325,376], [298,324,328], [336,376,323], [304,340,346], [168,408,413], [241,343,356], [326,349,371], [365,289,314], [324,348,328], [388,316,381], [328,348,296], [214,60,280], [444,395,448], [374,375,310], [313,278,375], [385,335,247], [419,413,311], [258,335,354], [482,477,257], [354,340,304], [301,367,196], [318,344,338], [388,350,282], [282,350,343], [314,267,365], [491,131,295], [440,287,313], [22,251,453], [356,328,288], [239,330,434], [264,337,336], [377,405,390], [357,39,195], [167,347,276], [450,490,148], [426,355,321], [409,205,488], [438,65,437], [257,477,419], [344,318,326], [30,347,167], [349,326,256], [256,326,271], [312,232,39], [414,28,226], [389,345,478], [85,424,361], [375,278,262], [318,316,282], [67,433,322], [394,281,279], [470,232,213], [209,190,306], [375,250,310], [354,304,258], [53,122,420], [318,282,326], [394,325,281], [434,349,255], [434,255,308], [298,331,299], [434,308,239], [324,298,305], [158,490,179], [499,71,162], [269,352,479], [65,156,32], [309,364,492], [168,413,419], [282,343,216], [343,241,216], [165,80,131], [322,133,67], [266,479,412], [479,352,412], [355,324,305], [145,217,148], [367,165,75], [253,75,254], [336,323,200], [200,323,242], [321,355,305], [297,242,323], [271,326,237], [325,315,281], [19,253,254], [499,162,63], [308,278,202], [323,321,297], [238,474,283], [284,258,304], [288,244,275], [30,167,291], [282,237,326], [111,291,167], [474,454,483], [296,244,288], [322,111,133], [248,274,296], [215,315,337], [337,264,215], [494,382,211], [275,356,288], [217,495,303], [274,244,296], [278,308,255], [417,295,300], [492,101,309], [296,288,328], [375,262,250], [116,373,41], [207,313,287], [122,317,420], [8,269,17], [216,219,282], [478,259,389], [73,123,184], [233,314,289], [247,248,296], [278,255,273], [335,258,247], [408,383,34], [252,263,268], [194,497,59], [34,54,218], [167,276,301], [304,310,284], [96,424,472], [260,67,133], [202,278,207], [237,282,212], [190,213,306], [53,333,421], [224,279,281], [314,233,249], [273,255,270], [383,168,285], [267,314,277], [262,278,273], [204,30,291], [223,32,156], [286,65,438], [477,474,168], [255,349,256], [51,266,166], [275,244,230], [265,469,66], [294,329,158], [280,407,311], [284,310,250], [339,238,283], [218,54,214], [61,24,14], [478,345,382], [213,232,435], [165,367,80], [277,314,243], [268,274,248], [287,267,207], [240,233,289], [246,273,270], [334,122,199], [244,274,261], [195,39,470], [263,252,273], [272,317,122], [208,220,244], [211,382,150], [232,60,435], [212,282,219], [9,302,253], [356,275,241], [131,80,81], [342,194,59], [334,16,152], [281,315,225], [246,263,273], [305,297,321], [218,408,34], [263,261,268], [268,284,252], [277,207,267], [389,357,93], [191,305,299], [348,247,296], [234,233,173], [65,32,437], [233,234,249], [231,255,256], [202,239,308], [263,208,261], [196,387,301], [223,125,403], [248,247,258], [248,258,268], [51,254,25], [222,299,279], [239,210,240], [239,289,330], [255,231,270], [252,262,273], [184,154,222], [243,186,277], [252,250,262], [284,250,252], [233,240,188], [299,305,298], [289,239,240], [367,253,302], [328,460,331], [485,116,143], [227,256,271], [150,463,211], [408,168,383], [484,453,9], [497,194,221], [227,231,256], [243,314,249], [178,188,240], [222,279,224], [345,389,93], [251,217,145], [270,192,246], [404,420,317], [238,339,166], [208,244,261], [150,292,265], [193,271,237], [39,372,312], [201,41,342], [479,266,51], [315,325,337], [200,242,297], [193,227,271], [150,345,292], [220,230,244], [311,218,280], [3,221,223], [209,469,48], [382,345,150], [198,219,216], [172,225,315], [137,241,275], [133,187,260], [230,135,157], [191,222,154], [495,22,71], [137,216,241], [477,98,474], [270,231,206], [389,259,431], [206,192,270], [276,80,367], [299,222,191], [224,184,222], [193,237,181], [191,297,305], [219,198,176], [219,149,212], [98,477,482], [25,479,51], [46,259,452], [16,334,199], [243,249,170], [277,186,207], [127,295,417], [155,172,315], [393,127,204], [247,348,495], [417,204,127], [200,297,142], [209,414,66], [172,189,225], [137,198,216], [173,233,188], [240,210,178], [275,230,157], [165,27,75], [200,171,264], [108,194,236], [167,133,111], [50,226,203], [224,225,184], [157,137,275], [220,135,230], [177,239,202], [155,315,215], [363,293,480], [200,142,171], [94,170,249], [177,207,186], [103,487,60], [454,245,102], [198,137,185], [146,301,387], [177,182,239], [32,223,403], [207,177,202], [8,473,351], [279,299,331], [237,212,130], [191,154,126], [417,300,81], [204,291,366], [141,149,219], [186,170,134], [71,484,162], [182,177,161], [176,141,219], [182,210,239], [181,175,193], [465,342,59], [361,450,235], [169,231,227], [48,265,43], [191,126,297], [186,134,177], [393,366,101], [237,130,181], [166,339,51], [212,149,163], [235,410,460], [159,185,137], [19,484,9], [178,173,188], [210,182,178], [215,264,171], [176,198,160], [12,162,484], [175,181,164], [482,257,12], [387,145,90], [225,120,184], [341,409,125], [227,144,105], [152,16,341], [225,224,281], [352,269,8], [227,193,144], [94,249,113], [92,208,192], [113,249,234], [146,167,301], [175,144,193], [206,231,169], [155,97,117], [192,206,92], [383,456,34], [425,462,364], [198,180,160], [403,125,409], [163,100,212], [185,180,198], [105,169,227], [347,140,81], [157,135,147], [384,379,377], [366,368,101], [286,238,129], [208,246,192], [294,179,424], [118,159,149], [215,138,155], [178,182,104], [184,123,154], [368,366,291], [187,146,90], [160,118,141], [496,494,211], [115,164,181], [447,85,475], [163,149,139], [99,159,137], [274,268,261], [431,259,46], [482,12,19], [181,130,115], [364,329,424], [293,339,283], [189,172,91], [424,96,425], [14,1,7], [100,151,212], [16,6,341], [163,139,144], [450,303,235], [480,483,363], [190,209,48], [147,137,157], [177,134,161], [153,161,134], [90,146,387], [87,92,206], [25,254,27], [272,467,317], [100,175,164], [100,144,175], [163,144,100], [368,291,322], [99,149,159], [120,73,184], [138,215,136], [83,113,173], [466,419,121], [89,182,161], [169,112,206], [168,238,285], [186,243,170], [91,120,189], [117,172,155], [178,132,173], [126,154,123], [147,135,86], [223,221,125], [414,226,66], [160,141,176], [272,373,116], [225,189,120], [117,91,172], [208,135,220], [133,167,146], [137,95,99], [419,466,257], [51,339,454], [414,54,34], [187,133,146], [136,142,126], [118,185,159], [126,142,297], [194,108,221], [105,114,169], [151,130,212], [123,136,126], [295,131,81], [357,290,93], [180,118,160], [464,8,17], [331,394,279], [118,149,141], [185,118,180], [132,178,76], [92,86,135], [147,95,137], [81,300,295], [121,311,407], [245,293,0], [425,364,424], [265,66,463], [49,123,73], [104,182,89], [366,393,204], [169,114,112], [19,9,253], [440,313,295], [190,470,213], [70,155,138], [306,435,214], [260,158,418], [42,132,76], [206,112,87], [134,84,153], [347,81,276], [107,91,117], [412,352,351], [91,107,120], [106,97,155], [70,106,155], [170,84,134], [83,173,132], [45,64,110], [209,66,469], [74,147,86], [54,414,209], [130,151,115], [107,73,120], [105,139,99], [495,217,22], [139,149,99], [351,497,412], [19,254,124], [208,92,135], [454,102,483], [105,99,72], [105,82,114], [125,221,108], [94,113,110], [115,100,164], [156,129,3], [312,197,498], [151,100,115], [95,72,99], [431,372,39], [45,110,83], [97,62,77], [361,183,450], [117,68,107], [123,49,56], [190,48,195], [285,456,383], [147,72,95], [68,117,97], [373,272,122], [363,0,293], [38,105,72], [110,113,83], [228,363,483], [89,161,153], [462,492,364], [342,236,194], [124,98,482], [132,42,83], [49,73,77], [105,38,82], [378,416,445], [170,94,61], [56,136,123], [254,75,27], [228,0,363], [88,112,114], [147,37,72], [55,87,112], [204,332,30], [47,92,87], [238,168,474], [138,136,56], [38,114,82], [92,69,58], [42,40,83], [306,214,54], [158,329,418], [86,92,58], [245,454,339], [409,488,403], [386,343,427], [208,263,246], [37,147,74], [69,92,47], [307,440,295], [109,303,495], [61,94,110], [61,110,64], [58,74,86], [214,435,60], [41,236,342], [140,347,30], [433,418,329], [61,153,84], [195,470,190], [62,97,106], [215,171,136], [483,102,228], [290,357,43], [166,266,129], [88,55,112], [116,501,272], [357,195,43], [52,73,107], [68,97,77], [148,303,450], [73,52,77], [65,286,129], [98,454,474], [40,45,83], [44,72,37], [61,14,153], [76,89,21], [265,292,43], [37,74,29], [257,466,63], [29,74,58], [52,68,77], [49,31,70], [89,76,104], [21,89,153], [21,153,14], [221,412,497], [58,35,29], [47,23,69], [258,284,268], [138,56,36], [61,64,20], [63,12,257], [31,49,77], [80,276,81], [21,57,76], [36,56,49], [102,245,0], [72,44,38], [35,58,69], [42,57,26], [107,68,52], [31,106,70], [36,70,138], [148,490,145], [119,0,228], [24,61,20], [424,179,183], [40,15,45], [424,183,361], [40,42,33], [49,70,36], [93,290,345], [23,47,55], [87,55,47], [418,433,67], [152,341,125], [18,14,24], [38,44,114], [64,15,20], [55,88,23], [33,10,40], [64,45,15], [431,357,389], [39,357,431], [309,329,364], [170,61,84], [10,15,40], [124,482,19], [35,69,29], [42,26,33], [57,21,26], [106,31,62], [13,114,44], [466,319,63], [265,463,150], [101,433,309], [102,119,228], [41,373,236], [266,3,129], [33,26,21], [37,29,11], [173,113,234], [171,142,136], [44,37,11], [218,214,280], [473,497,351], [88,114,13], [23,11,69], [44,11,13], [23,88,13], [29,69,11], [10,7,15], [352,8,351], [43,292,290], [412,221,3], [238,166,129], [33,4,10], [14,5,21], [140,30,332], [16,199,370], [23,13,11], [102,0,119], [4,14,10], [490,158,145], [399,235,460], [33,21,5], [14,7,10], [4,33,5], [42,76,57], [2,18,24], [178,104,76], [2,24,20], [2,20,15], [5,14,4], [14,18,1], [62,31,77], [18,2,15], [101,476,174], [71,22,484], [48,43,195], [15,1,18], [7,1,15]]
);
